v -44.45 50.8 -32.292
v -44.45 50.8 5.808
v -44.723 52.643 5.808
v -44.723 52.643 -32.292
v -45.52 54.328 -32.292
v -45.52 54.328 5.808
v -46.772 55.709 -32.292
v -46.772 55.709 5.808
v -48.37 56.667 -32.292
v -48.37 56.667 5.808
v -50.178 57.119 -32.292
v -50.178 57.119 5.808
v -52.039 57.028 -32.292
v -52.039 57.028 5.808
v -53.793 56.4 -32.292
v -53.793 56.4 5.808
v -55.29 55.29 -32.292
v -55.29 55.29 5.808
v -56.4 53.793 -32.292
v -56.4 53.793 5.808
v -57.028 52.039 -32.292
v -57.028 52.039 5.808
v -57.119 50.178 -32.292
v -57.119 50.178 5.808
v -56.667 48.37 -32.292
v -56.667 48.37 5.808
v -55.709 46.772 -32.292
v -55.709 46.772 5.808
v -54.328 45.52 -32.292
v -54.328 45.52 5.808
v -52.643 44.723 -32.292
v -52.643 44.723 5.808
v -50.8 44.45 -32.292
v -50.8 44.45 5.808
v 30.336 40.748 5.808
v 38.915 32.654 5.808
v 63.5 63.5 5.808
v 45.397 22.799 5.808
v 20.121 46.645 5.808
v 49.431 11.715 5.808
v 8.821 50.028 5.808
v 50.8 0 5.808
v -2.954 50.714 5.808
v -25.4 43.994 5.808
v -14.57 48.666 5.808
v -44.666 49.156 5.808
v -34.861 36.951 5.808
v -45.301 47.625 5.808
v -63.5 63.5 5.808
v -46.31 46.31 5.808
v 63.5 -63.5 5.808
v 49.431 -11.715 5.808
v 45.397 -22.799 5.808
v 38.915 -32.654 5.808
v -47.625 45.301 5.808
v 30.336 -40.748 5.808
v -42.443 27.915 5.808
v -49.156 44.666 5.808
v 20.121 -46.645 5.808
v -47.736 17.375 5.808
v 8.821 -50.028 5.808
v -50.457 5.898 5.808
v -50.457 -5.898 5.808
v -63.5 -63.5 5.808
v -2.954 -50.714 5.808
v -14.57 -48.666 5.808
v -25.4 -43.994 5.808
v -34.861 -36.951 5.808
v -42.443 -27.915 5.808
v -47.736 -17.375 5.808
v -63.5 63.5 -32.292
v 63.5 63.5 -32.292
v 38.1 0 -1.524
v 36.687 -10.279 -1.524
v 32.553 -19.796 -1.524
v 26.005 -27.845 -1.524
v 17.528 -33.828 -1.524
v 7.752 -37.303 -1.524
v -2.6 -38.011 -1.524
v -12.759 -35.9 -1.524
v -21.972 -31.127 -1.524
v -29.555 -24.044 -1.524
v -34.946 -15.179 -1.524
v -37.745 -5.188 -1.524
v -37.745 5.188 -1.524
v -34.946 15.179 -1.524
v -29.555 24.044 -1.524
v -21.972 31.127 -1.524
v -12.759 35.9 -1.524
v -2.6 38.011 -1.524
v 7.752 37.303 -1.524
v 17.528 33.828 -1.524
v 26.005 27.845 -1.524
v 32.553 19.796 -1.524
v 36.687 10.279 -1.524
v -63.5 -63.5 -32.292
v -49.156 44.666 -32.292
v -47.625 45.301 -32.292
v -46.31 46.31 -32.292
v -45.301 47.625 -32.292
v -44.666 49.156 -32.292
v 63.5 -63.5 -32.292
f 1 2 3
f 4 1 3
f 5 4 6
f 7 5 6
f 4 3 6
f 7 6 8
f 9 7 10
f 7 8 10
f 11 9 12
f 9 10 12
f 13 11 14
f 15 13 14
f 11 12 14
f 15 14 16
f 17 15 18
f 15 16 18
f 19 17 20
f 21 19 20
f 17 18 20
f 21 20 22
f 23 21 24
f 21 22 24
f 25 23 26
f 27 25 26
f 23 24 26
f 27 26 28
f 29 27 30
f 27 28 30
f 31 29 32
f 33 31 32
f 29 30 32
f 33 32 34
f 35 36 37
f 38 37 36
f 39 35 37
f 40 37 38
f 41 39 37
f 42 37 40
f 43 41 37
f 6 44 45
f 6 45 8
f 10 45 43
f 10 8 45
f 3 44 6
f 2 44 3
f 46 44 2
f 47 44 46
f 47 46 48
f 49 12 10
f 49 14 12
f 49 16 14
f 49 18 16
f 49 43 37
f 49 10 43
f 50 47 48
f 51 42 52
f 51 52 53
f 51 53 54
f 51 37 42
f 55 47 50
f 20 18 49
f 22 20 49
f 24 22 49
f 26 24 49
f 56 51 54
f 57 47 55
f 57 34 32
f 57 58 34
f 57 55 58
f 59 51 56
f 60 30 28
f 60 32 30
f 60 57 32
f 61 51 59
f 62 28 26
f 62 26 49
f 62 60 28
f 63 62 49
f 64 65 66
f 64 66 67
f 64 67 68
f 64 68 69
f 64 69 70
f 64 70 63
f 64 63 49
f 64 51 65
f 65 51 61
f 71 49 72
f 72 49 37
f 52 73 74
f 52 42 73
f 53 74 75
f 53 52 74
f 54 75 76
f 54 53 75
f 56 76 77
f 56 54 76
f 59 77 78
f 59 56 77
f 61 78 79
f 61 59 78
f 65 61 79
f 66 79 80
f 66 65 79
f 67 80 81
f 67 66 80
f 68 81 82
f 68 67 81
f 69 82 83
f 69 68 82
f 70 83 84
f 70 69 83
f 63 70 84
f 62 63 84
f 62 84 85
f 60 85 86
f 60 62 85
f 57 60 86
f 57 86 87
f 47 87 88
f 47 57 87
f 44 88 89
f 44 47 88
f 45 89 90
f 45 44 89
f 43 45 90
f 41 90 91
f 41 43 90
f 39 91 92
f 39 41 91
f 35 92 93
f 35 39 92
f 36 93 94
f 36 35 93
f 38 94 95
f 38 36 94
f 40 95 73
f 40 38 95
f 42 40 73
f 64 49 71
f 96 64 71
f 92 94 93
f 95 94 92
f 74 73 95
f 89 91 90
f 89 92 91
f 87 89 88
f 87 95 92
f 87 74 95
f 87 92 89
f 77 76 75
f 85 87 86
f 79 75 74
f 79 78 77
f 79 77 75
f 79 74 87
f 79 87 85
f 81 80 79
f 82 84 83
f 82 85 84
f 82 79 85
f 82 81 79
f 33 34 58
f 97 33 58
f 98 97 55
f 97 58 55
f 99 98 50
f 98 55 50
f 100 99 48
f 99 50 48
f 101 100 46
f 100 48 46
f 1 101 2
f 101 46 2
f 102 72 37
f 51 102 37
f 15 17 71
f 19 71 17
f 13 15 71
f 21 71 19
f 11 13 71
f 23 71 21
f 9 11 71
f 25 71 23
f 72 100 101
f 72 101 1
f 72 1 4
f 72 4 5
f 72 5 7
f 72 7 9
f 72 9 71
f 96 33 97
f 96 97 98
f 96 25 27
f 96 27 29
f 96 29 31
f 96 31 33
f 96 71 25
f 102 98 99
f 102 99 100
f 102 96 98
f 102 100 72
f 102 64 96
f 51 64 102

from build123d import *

# Parameters (mm, degrees)
F2_DEPTH = 63.5
F5_DEPTH = 50.8


with BuildPart() as f2:
    # F1 (on Front) → F2 (new body, symmetric)
    with BuildSketch(Plane.XZ):
        Polygon((-63.5, -32.291652), (63.5, -32.291652), (63.5, 5.808348), (0, 5.808348), (-63.5, 5.808348), align=None)
    extrude(amount=F2_DEPTH, both=True)

    # F0 (on Front) → F3 (revolve, cut)
    with BuildSketch(Plane.XZ):
        Polygon((38.1, -1.524), (50.8, 5.808348), (0, 5.808348), (0, -1.524), align=None)
    revolve(axis=Axis((0, 0, 2.142174), (0, 0, -1)), mode=Mode.SUBTRACT)

    # F4 (on Top) → F5 (cut, symmetric)
    with BuildSketch(Plane.XY):
        with BuildLine():
            ThreePointArc((-44.45, 50.8), (-55.290128, 55.290128), (-50.8, 44.45))
            Line((-50.8, 44.45), (-50.8, 50.8))
            Line((-50.8, 50.8), (-44.45, 50.8))
        make_face()
        with BuildLine():
            Line((-50.8, 50.8), (-50.8, 44.45))
            ThreePointArc((-50.8, 44.45), (-46.309872, 46.309872), (-44.45, 50.8))
            Line((-44.45, 50.8), (-50.8, 50.8))
        make_face()
    extrude(amount=F5_DEPTH, both=True, mode=Mode.SUBTRACT)


solid = f2.part
